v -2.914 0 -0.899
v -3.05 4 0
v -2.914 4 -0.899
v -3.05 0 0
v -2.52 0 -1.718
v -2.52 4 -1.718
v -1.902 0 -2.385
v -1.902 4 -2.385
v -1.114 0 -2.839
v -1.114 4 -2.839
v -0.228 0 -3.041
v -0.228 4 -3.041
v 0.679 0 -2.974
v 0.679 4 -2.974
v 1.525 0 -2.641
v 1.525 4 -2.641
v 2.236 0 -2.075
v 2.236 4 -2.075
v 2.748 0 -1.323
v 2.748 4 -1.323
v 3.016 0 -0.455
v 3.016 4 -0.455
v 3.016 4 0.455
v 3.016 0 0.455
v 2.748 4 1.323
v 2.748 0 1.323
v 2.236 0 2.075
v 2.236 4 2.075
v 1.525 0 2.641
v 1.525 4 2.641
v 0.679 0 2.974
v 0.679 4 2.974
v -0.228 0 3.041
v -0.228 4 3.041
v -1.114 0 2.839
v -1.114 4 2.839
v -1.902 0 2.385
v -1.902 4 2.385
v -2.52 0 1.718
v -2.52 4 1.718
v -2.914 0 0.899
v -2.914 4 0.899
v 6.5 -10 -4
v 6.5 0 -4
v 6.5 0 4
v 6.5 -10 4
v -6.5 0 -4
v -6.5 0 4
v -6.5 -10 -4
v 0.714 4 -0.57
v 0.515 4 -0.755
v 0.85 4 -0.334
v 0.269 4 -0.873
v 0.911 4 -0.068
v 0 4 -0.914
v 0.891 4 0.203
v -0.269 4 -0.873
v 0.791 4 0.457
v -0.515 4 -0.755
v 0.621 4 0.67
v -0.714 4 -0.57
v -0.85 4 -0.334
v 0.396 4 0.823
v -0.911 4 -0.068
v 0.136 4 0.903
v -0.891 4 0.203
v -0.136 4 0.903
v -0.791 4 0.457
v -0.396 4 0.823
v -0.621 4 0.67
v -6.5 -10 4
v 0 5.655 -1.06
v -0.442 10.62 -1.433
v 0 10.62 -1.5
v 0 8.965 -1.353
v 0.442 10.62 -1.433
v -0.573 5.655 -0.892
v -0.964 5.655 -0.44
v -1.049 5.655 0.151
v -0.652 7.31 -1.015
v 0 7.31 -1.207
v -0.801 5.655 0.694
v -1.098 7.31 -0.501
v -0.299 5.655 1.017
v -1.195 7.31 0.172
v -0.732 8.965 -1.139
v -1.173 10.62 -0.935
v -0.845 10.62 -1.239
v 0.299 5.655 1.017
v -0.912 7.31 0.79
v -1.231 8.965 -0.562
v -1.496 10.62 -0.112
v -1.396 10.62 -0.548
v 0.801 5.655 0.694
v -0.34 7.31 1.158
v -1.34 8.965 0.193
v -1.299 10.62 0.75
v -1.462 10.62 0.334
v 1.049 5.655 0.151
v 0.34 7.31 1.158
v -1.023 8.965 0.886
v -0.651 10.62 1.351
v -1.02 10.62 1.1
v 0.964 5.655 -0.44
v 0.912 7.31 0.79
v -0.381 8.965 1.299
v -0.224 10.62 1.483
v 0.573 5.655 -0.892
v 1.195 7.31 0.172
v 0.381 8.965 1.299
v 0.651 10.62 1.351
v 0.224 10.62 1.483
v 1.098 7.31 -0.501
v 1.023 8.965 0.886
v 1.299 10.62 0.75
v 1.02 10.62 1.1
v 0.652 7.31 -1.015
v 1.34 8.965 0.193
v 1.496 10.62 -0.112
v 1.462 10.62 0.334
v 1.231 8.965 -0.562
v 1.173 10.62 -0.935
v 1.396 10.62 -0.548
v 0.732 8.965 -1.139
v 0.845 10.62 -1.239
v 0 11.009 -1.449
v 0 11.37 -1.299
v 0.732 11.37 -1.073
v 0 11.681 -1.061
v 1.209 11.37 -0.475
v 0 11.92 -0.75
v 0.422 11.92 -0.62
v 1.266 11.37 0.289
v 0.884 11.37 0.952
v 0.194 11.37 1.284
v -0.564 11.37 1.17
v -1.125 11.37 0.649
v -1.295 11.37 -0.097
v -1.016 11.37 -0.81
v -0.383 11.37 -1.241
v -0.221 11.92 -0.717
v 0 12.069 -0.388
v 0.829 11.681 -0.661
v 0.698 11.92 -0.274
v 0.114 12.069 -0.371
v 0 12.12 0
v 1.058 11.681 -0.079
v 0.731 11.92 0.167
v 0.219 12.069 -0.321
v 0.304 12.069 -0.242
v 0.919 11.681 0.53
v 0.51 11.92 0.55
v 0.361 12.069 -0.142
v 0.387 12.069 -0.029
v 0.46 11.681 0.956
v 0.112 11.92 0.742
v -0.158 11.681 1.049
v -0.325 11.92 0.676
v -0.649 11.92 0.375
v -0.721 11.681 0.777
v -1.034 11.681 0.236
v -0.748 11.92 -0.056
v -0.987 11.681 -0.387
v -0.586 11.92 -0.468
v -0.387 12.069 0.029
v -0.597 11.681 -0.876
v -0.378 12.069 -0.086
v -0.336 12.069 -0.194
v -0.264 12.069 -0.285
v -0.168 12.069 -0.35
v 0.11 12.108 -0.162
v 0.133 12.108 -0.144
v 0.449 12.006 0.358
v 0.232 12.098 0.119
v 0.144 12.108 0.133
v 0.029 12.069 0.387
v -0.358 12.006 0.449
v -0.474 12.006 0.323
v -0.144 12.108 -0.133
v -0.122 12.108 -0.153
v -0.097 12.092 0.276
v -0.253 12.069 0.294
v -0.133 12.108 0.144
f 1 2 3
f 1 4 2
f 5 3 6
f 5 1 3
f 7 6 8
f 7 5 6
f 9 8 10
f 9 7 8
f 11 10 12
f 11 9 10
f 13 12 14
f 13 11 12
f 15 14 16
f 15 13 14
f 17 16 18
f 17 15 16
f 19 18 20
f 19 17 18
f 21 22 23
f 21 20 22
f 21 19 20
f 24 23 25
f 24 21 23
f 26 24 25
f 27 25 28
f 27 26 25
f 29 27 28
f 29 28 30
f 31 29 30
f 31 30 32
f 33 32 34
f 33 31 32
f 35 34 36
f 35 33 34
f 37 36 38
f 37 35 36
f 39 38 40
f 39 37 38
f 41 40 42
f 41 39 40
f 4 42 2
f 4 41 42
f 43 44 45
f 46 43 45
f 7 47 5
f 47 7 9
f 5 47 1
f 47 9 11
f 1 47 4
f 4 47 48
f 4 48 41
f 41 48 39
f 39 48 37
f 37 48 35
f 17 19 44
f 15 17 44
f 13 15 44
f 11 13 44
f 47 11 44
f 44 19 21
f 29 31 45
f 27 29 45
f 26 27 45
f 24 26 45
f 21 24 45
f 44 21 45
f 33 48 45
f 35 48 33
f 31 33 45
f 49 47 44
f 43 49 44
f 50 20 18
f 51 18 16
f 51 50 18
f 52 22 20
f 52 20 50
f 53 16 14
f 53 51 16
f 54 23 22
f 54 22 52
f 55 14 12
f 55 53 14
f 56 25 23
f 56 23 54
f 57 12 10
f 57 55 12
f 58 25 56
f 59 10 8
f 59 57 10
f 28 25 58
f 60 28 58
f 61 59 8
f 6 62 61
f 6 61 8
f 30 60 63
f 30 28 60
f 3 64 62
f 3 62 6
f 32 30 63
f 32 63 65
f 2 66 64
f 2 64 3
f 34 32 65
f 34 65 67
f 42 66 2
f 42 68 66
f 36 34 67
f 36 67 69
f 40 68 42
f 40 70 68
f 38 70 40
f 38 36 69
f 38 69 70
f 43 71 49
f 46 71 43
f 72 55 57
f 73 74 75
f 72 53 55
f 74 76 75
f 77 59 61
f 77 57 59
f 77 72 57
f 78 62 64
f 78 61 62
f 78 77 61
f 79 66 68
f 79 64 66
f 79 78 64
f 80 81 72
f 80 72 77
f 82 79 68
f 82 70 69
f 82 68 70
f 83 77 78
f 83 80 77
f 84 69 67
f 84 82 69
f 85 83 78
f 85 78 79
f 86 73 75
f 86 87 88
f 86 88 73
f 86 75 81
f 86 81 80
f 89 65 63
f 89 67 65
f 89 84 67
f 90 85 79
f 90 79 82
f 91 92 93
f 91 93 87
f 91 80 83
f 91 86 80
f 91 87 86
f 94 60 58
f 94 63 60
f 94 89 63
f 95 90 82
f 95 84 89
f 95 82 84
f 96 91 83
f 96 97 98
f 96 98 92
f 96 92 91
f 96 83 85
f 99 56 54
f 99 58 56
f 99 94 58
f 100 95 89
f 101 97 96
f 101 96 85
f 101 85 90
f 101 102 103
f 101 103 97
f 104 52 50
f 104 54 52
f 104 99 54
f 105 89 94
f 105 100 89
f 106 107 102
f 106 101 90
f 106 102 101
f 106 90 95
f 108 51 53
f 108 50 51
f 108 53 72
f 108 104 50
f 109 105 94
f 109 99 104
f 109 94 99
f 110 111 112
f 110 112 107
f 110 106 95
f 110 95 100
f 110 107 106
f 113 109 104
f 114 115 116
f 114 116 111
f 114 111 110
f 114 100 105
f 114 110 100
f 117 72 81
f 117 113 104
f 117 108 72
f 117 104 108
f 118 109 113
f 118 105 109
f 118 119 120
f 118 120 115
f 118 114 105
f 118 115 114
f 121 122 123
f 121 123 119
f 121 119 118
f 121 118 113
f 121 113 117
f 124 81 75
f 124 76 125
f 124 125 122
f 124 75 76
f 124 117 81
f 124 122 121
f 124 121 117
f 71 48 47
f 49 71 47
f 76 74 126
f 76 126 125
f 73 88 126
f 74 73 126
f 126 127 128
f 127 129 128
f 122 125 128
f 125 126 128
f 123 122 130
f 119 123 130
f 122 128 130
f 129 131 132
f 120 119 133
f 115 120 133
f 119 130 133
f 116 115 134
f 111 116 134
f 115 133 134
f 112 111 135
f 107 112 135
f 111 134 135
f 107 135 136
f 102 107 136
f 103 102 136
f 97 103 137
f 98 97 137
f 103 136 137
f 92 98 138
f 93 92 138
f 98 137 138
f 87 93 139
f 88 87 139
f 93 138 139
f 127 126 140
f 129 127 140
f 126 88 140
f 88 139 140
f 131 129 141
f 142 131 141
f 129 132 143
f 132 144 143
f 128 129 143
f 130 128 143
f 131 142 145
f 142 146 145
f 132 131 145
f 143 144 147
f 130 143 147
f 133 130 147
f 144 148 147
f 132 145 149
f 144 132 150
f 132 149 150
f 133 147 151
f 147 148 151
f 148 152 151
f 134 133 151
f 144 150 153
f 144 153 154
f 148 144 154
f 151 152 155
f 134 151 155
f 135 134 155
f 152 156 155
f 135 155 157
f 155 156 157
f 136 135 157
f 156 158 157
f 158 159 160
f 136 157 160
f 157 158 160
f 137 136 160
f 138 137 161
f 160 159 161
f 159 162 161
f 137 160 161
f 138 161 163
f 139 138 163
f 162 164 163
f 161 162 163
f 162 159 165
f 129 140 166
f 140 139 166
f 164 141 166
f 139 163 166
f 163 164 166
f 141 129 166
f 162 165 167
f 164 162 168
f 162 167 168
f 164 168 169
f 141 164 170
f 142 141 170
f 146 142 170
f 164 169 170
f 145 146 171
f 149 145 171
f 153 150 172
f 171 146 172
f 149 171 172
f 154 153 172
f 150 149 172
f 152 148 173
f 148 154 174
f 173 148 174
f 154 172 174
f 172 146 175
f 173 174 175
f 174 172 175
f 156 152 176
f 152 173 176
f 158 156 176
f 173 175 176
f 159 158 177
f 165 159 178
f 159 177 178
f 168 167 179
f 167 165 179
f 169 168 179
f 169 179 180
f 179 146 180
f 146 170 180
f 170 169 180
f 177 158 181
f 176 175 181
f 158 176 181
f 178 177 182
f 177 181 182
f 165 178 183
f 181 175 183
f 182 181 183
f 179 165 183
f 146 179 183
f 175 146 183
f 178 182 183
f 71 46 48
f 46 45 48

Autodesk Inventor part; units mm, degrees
ref_plane "YZ Plane" through (0, 0, 0) normal (1, 0, 0) x (0, 1, 0)
ref_plane "XZ Plane" through (0, 0, 0) normal (0, 1, 0) x (-1, 0, 0)
ref_plane "XY Plane" through (0, 0, 0) normal (0, 0, 1) x (1, 0, 0)
sketch "Sketch1" plane through (0, 0, 0) normal (0, 1, 0) x (-1, 0, 0)
  circle A0 centre (0, 0) radius 3.05
  dimension "d0" = 6.1
extrude "Extrusion1" add sketch "Sketch1" along normal blind 4
sketch "Sketch2" plane through (0, 0, 0) normal (1, 0, 0) x (0, 1, 0)
  line L0 (12.1205, 0) -> (4, 0)
  line L1 (4, -3.05) -> (4, 3.05) projected
  arc A0 (10.3569, -1.4766) -> (12.1205, 0) centre (10.6205, 0) ccw
  line L2 (4, -0.9136) -> (10.6205, -1.5)
  line L3 (4, -0.9136) -> (4, 0)
  point P0 (0, 0)
  dimension "d3" = 3
revolve "Revolution1" add sketch "Sketch2" angle 360 about axis through (0, 12.1205, 0) along (0, -1, 0) contours A0 L2 L1 L0
sketch "Sketch3" plane through (0, 0, 0) normal (0, -1, 0) x (1, 0, 0)
  line L0 (6.5, 4) -> (-6.5, 4)
  line L1 (-6.5, 4) -> (-6.5, -4)
  line L2 (-6.5, -4) -> (6.5, -4)
  line L3 (6.5, -4) -> (6.5, 4)
  point P0 (0, 0)
  point P1 (-6.5, 0)
  point P2 (0, 4)
  dimension "d5" = 13
  dimension "d6" = 8
extrude "Extrusion2" add sketch "Sketch3" along normal blind 10
properties part number "toggle switch"
